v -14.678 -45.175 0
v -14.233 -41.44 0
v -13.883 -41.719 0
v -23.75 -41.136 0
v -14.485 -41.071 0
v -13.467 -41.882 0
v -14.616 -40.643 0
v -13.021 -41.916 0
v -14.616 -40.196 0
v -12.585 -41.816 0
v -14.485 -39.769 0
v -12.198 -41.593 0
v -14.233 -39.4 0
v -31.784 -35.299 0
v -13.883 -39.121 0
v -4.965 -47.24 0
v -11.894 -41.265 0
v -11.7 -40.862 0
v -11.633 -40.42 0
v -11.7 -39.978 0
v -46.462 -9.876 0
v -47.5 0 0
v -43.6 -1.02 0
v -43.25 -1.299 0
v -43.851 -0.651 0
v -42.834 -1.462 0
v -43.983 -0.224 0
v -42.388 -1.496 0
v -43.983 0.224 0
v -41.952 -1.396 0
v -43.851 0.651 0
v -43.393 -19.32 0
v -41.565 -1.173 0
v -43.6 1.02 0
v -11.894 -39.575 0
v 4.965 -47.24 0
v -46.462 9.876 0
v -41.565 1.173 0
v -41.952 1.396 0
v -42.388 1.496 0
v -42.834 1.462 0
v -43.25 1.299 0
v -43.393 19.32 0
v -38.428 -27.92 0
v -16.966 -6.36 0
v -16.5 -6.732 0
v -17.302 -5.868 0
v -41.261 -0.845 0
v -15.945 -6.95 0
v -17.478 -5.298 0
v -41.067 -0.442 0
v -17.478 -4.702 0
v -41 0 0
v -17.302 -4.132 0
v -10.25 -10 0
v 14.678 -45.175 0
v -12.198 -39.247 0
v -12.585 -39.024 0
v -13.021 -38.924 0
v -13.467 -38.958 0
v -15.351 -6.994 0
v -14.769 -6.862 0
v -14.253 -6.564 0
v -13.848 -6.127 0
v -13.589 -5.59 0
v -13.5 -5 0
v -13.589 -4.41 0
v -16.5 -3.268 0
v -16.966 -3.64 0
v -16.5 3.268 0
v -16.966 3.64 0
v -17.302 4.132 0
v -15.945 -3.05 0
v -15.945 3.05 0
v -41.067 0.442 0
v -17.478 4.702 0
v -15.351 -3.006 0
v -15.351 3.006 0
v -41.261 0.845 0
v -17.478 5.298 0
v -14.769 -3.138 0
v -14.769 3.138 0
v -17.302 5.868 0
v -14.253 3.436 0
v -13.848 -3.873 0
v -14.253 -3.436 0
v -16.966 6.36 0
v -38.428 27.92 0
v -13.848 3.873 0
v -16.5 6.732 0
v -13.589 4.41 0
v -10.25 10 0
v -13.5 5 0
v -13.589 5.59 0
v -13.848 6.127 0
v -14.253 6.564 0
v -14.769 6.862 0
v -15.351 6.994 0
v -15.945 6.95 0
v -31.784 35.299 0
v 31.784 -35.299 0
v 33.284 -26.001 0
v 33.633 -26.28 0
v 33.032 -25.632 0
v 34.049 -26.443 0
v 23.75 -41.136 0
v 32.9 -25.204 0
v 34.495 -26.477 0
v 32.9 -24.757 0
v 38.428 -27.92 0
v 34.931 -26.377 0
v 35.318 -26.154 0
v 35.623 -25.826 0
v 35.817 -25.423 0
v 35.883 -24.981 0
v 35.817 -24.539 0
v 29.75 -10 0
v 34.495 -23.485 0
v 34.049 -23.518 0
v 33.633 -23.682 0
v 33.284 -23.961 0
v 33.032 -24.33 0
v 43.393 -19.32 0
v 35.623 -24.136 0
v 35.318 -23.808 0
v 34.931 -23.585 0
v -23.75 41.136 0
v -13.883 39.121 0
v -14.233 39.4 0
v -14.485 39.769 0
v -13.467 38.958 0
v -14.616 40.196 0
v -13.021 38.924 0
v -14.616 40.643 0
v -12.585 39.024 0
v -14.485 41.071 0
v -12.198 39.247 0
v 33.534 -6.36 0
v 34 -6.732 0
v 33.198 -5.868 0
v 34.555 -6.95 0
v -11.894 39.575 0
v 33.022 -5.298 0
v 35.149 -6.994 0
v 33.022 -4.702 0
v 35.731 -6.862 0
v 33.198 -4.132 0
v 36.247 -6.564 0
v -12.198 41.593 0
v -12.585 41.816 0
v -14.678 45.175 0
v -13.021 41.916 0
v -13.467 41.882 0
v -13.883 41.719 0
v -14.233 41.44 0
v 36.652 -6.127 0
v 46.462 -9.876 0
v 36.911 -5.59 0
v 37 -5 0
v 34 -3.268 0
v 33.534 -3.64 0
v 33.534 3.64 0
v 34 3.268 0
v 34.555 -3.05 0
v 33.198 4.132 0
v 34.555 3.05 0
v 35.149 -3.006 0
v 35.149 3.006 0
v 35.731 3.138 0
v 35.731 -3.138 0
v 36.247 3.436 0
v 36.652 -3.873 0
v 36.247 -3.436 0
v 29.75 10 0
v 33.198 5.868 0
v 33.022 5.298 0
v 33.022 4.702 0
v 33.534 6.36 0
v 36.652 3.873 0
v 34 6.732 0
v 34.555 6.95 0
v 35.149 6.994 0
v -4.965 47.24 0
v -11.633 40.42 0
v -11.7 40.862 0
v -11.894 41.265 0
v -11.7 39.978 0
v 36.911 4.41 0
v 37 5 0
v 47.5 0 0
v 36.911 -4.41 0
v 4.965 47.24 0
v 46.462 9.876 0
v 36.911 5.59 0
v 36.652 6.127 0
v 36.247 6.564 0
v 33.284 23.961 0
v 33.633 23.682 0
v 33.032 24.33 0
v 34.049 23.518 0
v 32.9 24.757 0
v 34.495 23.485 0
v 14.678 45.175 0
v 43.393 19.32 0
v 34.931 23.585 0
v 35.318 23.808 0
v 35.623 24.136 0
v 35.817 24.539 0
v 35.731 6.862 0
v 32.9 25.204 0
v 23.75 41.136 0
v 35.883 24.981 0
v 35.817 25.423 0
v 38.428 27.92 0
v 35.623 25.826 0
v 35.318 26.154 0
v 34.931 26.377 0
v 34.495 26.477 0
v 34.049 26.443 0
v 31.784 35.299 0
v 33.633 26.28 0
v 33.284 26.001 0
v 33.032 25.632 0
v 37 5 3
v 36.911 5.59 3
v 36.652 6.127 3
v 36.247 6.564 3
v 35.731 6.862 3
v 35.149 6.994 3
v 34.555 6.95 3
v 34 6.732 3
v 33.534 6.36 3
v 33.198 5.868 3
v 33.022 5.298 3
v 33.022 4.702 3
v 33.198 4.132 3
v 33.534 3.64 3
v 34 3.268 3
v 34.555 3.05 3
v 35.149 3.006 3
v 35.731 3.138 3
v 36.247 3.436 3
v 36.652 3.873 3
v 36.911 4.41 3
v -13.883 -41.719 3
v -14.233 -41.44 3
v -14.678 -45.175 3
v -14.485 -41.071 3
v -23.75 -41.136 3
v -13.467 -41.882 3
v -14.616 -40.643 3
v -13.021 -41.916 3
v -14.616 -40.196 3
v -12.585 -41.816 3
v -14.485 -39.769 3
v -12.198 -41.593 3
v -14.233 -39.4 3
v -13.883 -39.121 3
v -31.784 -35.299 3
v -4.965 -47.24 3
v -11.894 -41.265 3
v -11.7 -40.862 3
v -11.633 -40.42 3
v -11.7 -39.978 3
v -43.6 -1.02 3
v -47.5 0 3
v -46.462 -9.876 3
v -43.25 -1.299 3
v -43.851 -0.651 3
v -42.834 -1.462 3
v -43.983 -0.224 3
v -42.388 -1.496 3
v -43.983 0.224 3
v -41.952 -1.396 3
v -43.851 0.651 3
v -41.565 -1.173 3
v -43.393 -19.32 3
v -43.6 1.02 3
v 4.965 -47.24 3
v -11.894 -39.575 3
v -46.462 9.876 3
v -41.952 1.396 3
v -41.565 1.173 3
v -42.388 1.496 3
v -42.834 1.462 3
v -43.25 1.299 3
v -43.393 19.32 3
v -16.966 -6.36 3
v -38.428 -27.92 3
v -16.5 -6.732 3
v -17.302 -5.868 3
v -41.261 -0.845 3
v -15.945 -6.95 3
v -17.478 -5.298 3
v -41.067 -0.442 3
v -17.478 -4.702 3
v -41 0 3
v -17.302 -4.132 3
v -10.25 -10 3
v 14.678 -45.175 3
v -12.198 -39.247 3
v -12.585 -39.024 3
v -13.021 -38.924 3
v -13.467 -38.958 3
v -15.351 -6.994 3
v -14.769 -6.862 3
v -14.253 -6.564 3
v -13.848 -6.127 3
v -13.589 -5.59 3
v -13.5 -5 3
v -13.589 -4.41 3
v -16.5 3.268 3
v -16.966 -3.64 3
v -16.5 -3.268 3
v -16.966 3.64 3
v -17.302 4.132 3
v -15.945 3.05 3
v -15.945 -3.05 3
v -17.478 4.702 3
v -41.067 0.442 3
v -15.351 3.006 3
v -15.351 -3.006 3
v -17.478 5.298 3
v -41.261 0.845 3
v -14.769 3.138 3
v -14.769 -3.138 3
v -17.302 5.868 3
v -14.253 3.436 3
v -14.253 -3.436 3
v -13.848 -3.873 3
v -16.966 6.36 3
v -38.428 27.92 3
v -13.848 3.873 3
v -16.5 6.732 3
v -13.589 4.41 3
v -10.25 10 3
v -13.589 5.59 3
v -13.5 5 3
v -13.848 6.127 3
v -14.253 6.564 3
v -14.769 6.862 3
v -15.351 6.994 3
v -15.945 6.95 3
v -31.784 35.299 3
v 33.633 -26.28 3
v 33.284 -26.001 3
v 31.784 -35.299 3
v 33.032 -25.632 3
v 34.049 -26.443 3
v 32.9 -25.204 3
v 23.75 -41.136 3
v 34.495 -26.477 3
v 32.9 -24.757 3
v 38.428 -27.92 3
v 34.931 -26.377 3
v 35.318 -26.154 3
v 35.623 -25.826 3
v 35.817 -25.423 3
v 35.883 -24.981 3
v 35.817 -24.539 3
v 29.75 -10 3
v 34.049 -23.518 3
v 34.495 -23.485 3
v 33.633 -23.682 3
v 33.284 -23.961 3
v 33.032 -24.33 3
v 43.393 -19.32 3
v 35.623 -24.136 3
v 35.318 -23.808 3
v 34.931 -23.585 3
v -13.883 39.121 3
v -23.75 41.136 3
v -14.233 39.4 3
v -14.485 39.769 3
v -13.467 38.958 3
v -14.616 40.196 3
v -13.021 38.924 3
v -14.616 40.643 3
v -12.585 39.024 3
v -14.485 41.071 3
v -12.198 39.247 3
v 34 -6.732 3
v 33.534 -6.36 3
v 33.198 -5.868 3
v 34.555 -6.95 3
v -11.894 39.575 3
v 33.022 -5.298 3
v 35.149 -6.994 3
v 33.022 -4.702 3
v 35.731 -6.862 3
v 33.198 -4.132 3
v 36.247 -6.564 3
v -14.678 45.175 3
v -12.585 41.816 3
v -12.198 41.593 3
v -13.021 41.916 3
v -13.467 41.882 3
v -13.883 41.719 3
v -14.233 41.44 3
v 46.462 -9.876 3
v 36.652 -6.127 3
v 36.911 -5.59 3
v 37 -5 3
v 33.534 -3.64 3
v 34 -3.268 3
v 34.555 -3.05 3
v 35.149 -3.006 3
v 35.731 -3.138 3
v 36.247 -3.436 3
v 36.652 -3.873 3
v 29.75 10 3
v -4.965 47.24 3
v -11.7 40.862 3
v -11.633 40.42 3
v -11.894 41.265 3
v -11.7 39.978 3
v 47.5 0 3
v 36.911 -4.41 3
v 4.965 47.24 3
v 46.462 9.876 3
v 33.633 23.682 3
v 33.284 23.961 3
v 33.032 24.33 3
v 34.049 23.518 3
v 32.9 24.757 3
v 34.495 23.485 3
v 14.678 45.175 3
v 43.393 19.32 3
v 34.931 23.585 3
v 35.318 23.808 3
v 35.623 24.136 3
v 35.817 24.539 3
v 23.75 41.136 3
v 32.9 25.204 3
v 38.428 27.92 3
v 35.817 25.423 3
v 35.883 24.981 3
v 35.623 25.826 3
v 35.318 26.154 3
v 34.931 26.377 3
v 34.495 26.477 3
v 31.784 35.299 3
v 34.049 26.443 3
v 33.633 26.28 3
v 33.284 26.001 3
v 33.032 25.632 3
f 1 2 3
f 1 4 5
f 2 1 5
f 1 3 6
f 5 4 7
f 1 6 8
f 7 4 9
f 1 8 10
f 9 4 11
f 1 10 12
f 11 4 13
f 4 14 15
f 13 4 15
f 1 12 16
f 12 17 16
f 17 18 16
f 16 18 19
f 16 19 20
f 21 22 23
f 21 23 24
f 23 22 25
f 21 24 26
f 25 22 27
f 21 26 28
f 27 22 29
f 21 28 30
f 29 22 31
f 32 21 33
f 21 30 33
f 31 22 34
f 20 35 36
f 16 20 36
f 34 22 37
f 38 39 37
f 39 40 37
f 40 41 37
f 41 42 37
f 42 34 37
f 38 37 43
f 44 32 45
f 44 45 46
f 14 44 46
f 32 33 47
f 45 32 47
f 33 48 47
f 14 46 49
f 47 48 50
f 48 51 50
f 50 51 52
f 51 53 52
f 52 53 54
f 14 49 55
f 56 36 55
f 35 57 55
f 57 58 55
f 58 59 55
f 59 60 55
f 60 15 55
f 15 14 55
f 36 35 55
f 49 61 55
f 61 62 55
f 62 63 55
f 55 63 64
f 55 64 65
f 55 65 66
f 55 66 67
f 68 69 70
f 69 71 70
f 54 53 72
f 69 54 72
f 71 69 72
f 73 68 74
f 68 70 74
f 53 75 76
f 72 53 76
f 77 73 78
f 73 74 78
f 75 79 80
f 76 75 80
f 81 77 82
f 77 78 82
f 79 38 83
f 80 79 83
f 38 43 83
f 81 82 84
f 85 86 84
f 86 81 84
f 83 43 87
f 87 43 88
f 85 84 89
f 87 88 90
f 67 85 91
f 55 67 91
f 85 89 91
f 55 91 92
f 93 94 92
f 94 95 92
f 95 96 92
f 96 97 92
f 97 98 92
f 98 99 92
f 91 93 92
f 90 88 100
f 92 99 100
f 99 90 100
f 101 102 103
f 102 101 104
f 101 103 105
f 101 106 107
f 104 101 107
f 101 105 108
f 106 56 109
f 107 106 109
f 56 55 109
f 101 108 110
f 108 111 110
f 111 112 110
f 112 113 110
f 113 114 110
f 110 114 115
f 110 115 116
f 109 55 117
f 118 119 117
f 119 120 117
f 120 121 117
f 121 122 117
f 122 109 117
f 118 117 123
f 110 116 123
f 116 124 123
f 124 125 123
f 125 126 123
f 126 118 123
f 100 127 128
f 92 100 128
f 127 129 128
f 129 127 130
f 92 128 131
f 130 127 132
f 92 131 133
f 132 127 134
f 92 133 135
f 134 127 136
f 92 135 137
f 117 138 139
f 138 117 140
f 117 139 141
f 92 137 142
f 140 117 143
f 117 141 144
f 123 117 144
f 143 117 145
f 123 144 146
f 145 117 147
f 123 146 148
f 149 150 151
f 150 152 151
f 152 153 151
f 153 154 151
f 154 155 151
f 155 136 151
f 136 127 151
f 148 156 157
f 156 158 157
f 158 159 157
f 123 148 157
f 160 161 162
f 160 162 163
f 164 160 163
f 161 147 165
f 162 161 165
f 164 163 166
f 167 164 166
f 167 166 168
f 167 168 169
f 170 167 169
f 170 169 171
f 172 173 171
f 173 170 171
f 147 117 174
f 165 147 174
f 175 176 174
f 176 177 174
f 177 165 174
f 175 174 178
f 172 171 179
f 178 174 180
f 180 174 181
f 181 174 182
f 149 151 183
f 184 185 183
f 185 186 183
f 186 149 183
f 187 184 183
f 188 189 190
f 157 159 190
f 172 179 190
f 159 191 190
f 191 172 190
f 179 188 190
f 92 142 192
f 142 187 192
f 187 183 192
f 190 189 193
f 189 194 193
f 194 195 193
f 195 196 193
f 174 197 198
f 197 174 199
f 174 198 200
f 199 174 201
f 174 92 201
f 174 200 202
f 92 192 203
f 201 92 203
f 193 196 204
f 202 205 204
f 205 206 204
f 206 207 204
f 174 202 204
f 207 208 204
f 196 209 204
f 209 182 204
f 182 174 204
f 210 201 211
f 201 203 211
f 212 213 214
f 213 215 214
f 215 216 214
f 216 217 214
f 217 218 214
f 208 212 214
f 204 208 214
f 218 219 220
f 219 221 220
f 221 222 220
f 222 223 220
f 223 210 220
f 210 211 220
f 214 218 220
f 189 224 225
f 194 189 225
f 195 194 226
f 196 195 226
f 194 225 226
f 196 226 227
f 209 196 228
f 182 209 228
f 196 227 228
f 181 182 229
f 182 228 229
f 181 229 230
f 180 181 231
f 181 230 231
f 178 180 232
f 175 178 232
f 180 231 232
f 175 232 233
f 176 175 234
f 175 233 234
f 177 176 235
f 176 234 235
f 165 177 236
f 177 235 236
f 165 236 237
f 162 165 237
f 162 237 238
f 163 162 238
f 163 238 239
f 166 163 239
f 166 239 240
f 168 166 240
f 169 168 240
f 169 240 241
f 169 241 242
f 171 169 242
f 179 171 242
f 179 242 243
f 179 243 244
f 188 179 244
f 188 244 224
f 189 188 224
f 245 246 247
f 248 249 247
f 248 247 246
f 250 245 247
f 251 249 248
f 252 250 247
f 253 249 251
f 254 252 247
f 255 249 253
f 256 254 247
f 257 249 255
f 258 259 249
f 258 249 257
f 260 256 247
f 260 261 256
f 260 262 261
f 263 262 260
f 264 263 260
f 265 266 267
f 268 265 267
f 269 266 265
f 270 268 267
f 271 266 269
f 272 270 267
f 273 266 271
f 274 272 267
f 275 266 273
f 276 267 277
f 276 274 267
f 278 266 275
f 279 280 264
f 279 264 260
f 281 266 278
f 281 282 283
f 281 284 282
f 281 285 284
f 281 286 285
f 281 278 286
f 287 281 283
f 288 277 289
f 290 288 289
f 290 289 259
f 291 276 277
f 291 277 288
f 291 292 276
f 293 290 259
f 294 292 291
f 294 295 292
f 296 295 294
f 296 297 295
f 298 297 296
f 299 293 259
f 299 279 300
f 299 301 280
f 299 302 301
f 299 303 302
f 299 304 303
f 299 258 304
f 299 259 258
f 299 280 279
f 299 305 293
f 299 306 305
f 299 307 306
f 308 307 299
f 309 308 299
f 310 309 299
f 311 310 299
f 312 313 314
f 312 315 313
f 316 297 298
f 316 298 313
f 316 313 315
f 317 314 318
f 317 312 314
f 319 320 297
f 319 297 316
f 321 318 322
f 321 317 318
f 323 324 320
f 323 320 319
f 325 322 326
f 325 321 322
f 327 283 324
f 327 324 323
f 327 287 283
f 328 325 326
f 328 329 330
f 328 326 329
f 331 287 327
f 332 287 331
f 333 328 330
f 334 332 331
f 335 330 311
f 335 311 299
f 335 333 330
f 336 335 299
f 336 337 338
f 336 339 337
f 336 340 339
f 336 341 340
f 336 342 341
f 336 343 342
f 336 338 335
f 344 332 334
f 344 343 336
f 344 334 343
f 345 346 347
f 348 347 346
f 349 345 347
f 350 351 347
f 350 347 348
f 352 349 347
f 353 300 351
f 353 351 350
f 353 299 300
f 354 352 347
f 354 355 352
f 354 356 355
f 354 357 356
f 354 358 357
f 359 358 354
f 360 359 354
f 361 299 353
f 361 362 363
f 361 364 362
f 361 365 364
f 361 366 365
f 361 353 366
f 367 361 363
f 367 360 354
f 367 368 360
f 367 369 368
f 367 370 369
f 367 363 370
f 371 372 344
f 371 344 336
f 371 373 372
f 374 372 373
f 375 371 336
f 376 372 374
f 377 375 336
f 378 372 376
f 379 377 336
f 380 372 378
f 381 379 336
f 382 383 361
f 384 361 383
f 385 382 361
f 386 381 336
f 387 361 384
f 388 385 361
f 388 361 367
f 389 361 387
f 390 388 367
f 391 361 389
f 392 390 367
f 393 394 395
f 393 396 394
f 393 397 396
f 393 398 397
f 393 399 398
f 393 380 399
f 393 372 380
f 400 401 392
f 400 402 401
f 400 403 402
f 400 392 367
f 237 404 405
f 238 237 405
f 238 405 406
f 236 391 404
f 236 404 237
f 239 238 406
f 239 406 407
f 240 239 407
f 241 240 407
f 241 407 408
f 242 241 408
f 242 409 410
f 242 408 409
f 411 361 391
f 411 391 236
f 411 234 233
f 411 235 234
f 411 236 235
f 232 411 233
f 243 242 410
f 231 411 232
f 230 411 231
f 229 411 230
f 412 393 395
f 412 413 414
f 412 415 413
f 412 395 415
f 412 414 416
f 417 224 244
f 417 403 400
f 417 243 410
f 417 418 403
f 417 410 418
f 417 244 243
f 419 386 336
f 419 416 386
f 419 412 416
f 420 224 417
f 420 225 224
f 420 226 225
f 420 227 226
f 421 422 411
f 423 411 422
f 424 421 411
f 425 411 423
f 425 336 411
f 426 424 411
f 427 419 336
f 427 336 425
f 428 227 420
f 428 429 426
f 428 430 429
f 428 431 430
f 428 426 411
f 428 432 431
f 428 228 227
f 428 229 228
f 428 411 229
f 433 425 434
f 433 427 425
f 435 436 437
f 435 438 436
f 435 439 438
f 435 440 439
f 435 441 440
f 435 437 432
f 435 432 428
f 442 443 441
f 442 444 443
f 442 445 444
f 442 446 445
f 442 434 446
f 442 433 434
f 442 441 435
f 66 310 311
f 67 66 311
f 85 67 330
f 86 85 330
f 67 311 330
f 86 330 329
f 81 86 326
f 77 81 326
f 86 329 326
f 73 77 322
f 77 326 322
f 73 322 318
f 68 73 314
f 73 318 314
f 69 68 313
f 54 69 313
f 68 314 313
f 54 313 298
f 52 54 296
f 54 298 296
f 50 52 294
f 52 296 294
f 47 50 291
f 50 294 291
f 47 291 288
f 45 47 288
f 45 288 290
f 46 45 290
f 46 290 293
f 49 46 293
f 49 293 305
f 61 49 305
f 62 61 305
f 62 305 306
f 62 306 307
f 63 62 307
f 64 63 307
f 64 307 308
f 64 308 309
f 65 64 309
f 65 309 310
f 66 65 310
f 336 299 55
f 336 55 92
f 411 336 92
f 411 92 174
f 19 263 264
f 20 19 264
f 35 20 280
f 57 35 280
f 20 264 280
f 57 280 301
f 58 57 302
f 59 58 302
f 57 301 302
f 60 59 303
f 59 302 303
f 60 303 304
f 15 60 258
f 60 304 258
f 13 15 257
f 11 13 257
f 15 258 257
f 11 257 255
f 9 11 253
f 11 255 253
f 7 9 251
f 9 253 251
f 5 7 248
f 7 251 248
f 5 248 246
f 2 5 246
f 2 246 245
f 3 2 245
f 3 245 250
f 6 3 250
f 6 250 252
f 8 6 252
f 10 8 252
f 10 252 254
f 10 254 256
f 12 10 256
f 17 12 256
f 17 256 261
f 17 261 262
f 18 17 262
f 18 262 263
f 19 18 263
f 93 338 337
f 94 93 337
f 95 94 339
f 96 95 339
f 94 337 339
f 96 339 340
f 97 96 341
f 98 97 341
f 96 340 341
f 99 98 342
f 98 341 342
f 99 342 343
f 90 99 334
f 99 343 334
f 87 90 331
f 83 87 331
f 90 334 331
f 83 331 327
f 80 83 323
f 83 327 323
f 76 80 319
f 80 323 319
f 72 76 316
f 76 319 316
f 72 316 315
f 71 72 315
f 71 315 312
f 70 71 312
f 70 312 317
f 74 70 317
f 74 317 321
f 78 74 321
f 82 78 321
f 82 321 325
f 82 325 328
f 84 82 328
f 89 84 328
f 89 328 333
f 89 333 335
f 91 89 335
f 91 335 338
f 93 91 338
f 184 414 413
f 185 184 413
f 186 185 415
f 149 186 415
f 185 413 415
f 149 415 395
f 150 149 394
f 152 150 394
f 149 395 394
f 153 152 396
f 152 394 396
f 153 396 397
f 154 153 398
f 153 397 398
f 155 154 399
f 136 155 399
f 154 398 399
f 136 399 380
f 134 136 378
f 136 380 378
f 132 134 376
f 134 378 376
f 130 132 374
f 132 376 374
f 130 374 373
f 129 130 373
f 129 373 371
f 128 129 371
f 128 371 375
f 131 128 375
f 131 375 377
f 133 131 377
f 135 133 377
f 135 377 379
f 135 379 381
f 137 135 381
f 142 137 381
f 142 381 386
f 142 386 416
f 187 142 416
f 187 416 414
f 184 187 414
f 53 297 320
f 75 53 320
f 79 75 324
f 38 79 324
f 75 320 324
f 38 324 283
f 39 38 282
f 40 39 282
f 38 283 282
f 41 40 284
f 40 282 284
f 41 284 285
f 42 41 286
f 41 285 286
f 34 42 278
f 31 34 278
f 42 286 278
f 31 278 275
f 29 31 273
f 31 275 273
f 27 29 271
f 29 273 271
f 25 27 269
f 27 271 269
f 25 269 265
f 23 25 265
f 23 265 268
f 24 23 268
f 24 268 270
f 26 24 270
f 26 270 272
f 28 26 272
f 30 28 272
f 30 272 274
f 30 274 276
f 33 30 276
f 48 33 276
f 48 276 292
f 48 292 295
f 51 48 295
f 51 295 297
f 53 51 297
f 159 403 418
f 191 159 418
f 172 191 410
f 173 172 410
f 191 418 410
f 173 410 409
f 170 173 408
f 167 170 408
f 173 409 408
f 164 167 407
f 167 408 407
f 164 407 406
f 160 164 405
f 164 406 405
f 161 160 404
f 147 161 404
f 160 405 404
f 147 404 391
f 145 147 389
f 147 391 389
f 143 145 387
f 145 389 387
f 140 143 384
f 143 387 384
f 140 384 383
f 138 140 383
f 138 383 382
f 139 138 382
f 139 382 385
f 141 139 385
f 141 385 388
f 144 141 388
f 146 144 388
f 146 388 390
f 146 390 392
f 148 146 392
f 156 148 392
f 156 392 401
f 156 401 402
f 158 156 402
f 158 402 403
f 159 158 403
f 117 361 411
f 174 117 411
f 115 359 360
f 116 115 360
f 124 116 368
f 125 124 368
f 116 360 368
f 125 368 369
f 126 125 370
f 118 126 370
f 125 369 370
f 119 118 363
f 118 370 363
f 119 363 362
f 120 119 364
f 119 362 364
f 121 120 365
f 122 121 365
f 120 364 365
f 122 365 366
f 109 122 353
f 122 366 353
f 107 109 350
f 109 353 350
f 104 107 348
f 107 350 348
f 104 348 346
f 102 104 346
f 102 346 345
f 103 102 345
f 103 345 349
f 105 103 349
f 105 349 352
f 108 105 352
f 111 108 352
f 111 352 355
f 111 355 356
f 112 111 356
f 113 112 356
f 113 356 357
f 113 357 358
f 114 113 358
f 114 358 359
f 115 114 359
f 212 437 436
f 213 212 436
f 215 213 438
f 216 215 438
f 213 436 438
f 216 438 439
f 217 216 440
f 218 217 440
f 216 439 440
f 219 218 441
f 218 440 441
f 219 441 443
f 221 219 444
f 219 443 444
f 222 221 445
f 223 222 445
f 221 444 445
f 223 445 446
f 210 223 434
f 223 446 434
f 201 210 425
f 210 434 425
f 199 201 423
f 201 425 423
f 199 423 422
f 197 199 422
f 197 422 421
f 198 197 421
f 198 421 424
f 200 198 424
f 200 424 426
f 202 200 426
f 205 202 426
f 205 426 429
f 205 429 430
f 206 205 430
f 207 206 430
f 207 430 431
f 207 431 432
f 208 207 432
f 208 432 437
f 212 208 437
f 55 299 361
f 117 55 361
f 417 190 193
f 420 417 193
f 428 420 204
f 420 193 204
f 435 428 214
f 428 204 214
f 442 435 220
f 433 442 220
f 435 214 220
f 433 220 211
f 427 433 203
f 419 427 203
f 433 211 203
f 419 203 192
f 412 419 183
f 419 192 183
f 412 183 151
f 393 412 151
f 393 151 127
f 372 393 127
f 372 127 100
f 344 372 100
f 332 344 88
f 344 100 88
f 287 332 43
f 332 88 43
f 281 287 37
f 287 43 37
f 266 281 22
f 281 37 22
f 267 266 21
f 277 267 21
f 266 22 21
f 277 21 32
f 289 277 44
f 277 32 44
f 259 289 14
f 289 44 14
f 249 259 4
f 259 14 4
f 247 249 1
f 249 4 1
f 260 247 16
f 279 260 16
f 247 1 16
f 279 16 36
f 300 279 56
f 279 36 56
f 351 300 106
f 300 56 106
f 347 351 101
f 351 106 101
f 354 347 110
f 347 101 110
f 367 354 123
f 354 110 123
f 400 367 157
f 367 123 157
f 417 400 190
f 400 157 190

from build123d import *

# Parameters (mm, degrees)
CROQUIS1_R              = 47.5
SALIENTE_EXTRUIR1_DEPTH = 3
CROQUIS3_R              = 2
CROQUIS3_W              = 40
CROQUIS3_H              = 20
CORTAR_EXTRUIR1_DEPTH   = 4
CROQUIS4_R              = 1.5
CORTAR_EXTRUIR2_DEPTH   = 4


with BuildPart() as part:
    # Croquis1 → Saliente-Extruir1 (new body)
    with BuildSketch(Plane.XY):
        Circle(CROQUIS1_R)
    extrude(amount=SALIENTE_EXTRUIR1_DEPTH)

    # Croquis3 → Cortar-Extruir1 (cut, through all)
    with BuildSketch(Plane.XY.offset(3)):
        with Locations((35, -5)):
            Circle(CROQUIS3_R)
        with Locations((35, 5)):
            Circle(CROQUIS3_R)
        with Locations((-15.5, -5)):
            Circle(CROQUIS3_R)
        with Locations((-15.5, 5)):
            Circle(CROQUIS3_R)
        with Locations((9.75, 0)):
            Rectangle(CROQUIS3_W, CROQUIS3_H)
    extrude(amount=-CORTAR_EXTRUIR1_DEPTH, mode=Mode.SUBTRACT)

    # Croquis4 → Cortar-Extruir2 (cut, through all)
    with BuildSketch(Plane.XY.offset(3)):
        with Locations((-42.5, 0)):
            Circle(CROQUIS4_R)
        with Locations((-13.133222261, 40.419901943)):
            Circle(CROQUIS4_R)
        with Locations((34.383222261, 24.980873222)):
            Circle(CROQUIS4_R)
        with Locations((34.383222261, -24.980873222)):
            Circle(CROQUIS4_R)
        with Locations((-13.133222261, -40.419901943)):
            Circle(CROQUIS4_R)
    extrude(amount=-CORTAR_EXTRUIR2_DEPTH, mode=Mode.SUBTRACT)


solid = part.part
